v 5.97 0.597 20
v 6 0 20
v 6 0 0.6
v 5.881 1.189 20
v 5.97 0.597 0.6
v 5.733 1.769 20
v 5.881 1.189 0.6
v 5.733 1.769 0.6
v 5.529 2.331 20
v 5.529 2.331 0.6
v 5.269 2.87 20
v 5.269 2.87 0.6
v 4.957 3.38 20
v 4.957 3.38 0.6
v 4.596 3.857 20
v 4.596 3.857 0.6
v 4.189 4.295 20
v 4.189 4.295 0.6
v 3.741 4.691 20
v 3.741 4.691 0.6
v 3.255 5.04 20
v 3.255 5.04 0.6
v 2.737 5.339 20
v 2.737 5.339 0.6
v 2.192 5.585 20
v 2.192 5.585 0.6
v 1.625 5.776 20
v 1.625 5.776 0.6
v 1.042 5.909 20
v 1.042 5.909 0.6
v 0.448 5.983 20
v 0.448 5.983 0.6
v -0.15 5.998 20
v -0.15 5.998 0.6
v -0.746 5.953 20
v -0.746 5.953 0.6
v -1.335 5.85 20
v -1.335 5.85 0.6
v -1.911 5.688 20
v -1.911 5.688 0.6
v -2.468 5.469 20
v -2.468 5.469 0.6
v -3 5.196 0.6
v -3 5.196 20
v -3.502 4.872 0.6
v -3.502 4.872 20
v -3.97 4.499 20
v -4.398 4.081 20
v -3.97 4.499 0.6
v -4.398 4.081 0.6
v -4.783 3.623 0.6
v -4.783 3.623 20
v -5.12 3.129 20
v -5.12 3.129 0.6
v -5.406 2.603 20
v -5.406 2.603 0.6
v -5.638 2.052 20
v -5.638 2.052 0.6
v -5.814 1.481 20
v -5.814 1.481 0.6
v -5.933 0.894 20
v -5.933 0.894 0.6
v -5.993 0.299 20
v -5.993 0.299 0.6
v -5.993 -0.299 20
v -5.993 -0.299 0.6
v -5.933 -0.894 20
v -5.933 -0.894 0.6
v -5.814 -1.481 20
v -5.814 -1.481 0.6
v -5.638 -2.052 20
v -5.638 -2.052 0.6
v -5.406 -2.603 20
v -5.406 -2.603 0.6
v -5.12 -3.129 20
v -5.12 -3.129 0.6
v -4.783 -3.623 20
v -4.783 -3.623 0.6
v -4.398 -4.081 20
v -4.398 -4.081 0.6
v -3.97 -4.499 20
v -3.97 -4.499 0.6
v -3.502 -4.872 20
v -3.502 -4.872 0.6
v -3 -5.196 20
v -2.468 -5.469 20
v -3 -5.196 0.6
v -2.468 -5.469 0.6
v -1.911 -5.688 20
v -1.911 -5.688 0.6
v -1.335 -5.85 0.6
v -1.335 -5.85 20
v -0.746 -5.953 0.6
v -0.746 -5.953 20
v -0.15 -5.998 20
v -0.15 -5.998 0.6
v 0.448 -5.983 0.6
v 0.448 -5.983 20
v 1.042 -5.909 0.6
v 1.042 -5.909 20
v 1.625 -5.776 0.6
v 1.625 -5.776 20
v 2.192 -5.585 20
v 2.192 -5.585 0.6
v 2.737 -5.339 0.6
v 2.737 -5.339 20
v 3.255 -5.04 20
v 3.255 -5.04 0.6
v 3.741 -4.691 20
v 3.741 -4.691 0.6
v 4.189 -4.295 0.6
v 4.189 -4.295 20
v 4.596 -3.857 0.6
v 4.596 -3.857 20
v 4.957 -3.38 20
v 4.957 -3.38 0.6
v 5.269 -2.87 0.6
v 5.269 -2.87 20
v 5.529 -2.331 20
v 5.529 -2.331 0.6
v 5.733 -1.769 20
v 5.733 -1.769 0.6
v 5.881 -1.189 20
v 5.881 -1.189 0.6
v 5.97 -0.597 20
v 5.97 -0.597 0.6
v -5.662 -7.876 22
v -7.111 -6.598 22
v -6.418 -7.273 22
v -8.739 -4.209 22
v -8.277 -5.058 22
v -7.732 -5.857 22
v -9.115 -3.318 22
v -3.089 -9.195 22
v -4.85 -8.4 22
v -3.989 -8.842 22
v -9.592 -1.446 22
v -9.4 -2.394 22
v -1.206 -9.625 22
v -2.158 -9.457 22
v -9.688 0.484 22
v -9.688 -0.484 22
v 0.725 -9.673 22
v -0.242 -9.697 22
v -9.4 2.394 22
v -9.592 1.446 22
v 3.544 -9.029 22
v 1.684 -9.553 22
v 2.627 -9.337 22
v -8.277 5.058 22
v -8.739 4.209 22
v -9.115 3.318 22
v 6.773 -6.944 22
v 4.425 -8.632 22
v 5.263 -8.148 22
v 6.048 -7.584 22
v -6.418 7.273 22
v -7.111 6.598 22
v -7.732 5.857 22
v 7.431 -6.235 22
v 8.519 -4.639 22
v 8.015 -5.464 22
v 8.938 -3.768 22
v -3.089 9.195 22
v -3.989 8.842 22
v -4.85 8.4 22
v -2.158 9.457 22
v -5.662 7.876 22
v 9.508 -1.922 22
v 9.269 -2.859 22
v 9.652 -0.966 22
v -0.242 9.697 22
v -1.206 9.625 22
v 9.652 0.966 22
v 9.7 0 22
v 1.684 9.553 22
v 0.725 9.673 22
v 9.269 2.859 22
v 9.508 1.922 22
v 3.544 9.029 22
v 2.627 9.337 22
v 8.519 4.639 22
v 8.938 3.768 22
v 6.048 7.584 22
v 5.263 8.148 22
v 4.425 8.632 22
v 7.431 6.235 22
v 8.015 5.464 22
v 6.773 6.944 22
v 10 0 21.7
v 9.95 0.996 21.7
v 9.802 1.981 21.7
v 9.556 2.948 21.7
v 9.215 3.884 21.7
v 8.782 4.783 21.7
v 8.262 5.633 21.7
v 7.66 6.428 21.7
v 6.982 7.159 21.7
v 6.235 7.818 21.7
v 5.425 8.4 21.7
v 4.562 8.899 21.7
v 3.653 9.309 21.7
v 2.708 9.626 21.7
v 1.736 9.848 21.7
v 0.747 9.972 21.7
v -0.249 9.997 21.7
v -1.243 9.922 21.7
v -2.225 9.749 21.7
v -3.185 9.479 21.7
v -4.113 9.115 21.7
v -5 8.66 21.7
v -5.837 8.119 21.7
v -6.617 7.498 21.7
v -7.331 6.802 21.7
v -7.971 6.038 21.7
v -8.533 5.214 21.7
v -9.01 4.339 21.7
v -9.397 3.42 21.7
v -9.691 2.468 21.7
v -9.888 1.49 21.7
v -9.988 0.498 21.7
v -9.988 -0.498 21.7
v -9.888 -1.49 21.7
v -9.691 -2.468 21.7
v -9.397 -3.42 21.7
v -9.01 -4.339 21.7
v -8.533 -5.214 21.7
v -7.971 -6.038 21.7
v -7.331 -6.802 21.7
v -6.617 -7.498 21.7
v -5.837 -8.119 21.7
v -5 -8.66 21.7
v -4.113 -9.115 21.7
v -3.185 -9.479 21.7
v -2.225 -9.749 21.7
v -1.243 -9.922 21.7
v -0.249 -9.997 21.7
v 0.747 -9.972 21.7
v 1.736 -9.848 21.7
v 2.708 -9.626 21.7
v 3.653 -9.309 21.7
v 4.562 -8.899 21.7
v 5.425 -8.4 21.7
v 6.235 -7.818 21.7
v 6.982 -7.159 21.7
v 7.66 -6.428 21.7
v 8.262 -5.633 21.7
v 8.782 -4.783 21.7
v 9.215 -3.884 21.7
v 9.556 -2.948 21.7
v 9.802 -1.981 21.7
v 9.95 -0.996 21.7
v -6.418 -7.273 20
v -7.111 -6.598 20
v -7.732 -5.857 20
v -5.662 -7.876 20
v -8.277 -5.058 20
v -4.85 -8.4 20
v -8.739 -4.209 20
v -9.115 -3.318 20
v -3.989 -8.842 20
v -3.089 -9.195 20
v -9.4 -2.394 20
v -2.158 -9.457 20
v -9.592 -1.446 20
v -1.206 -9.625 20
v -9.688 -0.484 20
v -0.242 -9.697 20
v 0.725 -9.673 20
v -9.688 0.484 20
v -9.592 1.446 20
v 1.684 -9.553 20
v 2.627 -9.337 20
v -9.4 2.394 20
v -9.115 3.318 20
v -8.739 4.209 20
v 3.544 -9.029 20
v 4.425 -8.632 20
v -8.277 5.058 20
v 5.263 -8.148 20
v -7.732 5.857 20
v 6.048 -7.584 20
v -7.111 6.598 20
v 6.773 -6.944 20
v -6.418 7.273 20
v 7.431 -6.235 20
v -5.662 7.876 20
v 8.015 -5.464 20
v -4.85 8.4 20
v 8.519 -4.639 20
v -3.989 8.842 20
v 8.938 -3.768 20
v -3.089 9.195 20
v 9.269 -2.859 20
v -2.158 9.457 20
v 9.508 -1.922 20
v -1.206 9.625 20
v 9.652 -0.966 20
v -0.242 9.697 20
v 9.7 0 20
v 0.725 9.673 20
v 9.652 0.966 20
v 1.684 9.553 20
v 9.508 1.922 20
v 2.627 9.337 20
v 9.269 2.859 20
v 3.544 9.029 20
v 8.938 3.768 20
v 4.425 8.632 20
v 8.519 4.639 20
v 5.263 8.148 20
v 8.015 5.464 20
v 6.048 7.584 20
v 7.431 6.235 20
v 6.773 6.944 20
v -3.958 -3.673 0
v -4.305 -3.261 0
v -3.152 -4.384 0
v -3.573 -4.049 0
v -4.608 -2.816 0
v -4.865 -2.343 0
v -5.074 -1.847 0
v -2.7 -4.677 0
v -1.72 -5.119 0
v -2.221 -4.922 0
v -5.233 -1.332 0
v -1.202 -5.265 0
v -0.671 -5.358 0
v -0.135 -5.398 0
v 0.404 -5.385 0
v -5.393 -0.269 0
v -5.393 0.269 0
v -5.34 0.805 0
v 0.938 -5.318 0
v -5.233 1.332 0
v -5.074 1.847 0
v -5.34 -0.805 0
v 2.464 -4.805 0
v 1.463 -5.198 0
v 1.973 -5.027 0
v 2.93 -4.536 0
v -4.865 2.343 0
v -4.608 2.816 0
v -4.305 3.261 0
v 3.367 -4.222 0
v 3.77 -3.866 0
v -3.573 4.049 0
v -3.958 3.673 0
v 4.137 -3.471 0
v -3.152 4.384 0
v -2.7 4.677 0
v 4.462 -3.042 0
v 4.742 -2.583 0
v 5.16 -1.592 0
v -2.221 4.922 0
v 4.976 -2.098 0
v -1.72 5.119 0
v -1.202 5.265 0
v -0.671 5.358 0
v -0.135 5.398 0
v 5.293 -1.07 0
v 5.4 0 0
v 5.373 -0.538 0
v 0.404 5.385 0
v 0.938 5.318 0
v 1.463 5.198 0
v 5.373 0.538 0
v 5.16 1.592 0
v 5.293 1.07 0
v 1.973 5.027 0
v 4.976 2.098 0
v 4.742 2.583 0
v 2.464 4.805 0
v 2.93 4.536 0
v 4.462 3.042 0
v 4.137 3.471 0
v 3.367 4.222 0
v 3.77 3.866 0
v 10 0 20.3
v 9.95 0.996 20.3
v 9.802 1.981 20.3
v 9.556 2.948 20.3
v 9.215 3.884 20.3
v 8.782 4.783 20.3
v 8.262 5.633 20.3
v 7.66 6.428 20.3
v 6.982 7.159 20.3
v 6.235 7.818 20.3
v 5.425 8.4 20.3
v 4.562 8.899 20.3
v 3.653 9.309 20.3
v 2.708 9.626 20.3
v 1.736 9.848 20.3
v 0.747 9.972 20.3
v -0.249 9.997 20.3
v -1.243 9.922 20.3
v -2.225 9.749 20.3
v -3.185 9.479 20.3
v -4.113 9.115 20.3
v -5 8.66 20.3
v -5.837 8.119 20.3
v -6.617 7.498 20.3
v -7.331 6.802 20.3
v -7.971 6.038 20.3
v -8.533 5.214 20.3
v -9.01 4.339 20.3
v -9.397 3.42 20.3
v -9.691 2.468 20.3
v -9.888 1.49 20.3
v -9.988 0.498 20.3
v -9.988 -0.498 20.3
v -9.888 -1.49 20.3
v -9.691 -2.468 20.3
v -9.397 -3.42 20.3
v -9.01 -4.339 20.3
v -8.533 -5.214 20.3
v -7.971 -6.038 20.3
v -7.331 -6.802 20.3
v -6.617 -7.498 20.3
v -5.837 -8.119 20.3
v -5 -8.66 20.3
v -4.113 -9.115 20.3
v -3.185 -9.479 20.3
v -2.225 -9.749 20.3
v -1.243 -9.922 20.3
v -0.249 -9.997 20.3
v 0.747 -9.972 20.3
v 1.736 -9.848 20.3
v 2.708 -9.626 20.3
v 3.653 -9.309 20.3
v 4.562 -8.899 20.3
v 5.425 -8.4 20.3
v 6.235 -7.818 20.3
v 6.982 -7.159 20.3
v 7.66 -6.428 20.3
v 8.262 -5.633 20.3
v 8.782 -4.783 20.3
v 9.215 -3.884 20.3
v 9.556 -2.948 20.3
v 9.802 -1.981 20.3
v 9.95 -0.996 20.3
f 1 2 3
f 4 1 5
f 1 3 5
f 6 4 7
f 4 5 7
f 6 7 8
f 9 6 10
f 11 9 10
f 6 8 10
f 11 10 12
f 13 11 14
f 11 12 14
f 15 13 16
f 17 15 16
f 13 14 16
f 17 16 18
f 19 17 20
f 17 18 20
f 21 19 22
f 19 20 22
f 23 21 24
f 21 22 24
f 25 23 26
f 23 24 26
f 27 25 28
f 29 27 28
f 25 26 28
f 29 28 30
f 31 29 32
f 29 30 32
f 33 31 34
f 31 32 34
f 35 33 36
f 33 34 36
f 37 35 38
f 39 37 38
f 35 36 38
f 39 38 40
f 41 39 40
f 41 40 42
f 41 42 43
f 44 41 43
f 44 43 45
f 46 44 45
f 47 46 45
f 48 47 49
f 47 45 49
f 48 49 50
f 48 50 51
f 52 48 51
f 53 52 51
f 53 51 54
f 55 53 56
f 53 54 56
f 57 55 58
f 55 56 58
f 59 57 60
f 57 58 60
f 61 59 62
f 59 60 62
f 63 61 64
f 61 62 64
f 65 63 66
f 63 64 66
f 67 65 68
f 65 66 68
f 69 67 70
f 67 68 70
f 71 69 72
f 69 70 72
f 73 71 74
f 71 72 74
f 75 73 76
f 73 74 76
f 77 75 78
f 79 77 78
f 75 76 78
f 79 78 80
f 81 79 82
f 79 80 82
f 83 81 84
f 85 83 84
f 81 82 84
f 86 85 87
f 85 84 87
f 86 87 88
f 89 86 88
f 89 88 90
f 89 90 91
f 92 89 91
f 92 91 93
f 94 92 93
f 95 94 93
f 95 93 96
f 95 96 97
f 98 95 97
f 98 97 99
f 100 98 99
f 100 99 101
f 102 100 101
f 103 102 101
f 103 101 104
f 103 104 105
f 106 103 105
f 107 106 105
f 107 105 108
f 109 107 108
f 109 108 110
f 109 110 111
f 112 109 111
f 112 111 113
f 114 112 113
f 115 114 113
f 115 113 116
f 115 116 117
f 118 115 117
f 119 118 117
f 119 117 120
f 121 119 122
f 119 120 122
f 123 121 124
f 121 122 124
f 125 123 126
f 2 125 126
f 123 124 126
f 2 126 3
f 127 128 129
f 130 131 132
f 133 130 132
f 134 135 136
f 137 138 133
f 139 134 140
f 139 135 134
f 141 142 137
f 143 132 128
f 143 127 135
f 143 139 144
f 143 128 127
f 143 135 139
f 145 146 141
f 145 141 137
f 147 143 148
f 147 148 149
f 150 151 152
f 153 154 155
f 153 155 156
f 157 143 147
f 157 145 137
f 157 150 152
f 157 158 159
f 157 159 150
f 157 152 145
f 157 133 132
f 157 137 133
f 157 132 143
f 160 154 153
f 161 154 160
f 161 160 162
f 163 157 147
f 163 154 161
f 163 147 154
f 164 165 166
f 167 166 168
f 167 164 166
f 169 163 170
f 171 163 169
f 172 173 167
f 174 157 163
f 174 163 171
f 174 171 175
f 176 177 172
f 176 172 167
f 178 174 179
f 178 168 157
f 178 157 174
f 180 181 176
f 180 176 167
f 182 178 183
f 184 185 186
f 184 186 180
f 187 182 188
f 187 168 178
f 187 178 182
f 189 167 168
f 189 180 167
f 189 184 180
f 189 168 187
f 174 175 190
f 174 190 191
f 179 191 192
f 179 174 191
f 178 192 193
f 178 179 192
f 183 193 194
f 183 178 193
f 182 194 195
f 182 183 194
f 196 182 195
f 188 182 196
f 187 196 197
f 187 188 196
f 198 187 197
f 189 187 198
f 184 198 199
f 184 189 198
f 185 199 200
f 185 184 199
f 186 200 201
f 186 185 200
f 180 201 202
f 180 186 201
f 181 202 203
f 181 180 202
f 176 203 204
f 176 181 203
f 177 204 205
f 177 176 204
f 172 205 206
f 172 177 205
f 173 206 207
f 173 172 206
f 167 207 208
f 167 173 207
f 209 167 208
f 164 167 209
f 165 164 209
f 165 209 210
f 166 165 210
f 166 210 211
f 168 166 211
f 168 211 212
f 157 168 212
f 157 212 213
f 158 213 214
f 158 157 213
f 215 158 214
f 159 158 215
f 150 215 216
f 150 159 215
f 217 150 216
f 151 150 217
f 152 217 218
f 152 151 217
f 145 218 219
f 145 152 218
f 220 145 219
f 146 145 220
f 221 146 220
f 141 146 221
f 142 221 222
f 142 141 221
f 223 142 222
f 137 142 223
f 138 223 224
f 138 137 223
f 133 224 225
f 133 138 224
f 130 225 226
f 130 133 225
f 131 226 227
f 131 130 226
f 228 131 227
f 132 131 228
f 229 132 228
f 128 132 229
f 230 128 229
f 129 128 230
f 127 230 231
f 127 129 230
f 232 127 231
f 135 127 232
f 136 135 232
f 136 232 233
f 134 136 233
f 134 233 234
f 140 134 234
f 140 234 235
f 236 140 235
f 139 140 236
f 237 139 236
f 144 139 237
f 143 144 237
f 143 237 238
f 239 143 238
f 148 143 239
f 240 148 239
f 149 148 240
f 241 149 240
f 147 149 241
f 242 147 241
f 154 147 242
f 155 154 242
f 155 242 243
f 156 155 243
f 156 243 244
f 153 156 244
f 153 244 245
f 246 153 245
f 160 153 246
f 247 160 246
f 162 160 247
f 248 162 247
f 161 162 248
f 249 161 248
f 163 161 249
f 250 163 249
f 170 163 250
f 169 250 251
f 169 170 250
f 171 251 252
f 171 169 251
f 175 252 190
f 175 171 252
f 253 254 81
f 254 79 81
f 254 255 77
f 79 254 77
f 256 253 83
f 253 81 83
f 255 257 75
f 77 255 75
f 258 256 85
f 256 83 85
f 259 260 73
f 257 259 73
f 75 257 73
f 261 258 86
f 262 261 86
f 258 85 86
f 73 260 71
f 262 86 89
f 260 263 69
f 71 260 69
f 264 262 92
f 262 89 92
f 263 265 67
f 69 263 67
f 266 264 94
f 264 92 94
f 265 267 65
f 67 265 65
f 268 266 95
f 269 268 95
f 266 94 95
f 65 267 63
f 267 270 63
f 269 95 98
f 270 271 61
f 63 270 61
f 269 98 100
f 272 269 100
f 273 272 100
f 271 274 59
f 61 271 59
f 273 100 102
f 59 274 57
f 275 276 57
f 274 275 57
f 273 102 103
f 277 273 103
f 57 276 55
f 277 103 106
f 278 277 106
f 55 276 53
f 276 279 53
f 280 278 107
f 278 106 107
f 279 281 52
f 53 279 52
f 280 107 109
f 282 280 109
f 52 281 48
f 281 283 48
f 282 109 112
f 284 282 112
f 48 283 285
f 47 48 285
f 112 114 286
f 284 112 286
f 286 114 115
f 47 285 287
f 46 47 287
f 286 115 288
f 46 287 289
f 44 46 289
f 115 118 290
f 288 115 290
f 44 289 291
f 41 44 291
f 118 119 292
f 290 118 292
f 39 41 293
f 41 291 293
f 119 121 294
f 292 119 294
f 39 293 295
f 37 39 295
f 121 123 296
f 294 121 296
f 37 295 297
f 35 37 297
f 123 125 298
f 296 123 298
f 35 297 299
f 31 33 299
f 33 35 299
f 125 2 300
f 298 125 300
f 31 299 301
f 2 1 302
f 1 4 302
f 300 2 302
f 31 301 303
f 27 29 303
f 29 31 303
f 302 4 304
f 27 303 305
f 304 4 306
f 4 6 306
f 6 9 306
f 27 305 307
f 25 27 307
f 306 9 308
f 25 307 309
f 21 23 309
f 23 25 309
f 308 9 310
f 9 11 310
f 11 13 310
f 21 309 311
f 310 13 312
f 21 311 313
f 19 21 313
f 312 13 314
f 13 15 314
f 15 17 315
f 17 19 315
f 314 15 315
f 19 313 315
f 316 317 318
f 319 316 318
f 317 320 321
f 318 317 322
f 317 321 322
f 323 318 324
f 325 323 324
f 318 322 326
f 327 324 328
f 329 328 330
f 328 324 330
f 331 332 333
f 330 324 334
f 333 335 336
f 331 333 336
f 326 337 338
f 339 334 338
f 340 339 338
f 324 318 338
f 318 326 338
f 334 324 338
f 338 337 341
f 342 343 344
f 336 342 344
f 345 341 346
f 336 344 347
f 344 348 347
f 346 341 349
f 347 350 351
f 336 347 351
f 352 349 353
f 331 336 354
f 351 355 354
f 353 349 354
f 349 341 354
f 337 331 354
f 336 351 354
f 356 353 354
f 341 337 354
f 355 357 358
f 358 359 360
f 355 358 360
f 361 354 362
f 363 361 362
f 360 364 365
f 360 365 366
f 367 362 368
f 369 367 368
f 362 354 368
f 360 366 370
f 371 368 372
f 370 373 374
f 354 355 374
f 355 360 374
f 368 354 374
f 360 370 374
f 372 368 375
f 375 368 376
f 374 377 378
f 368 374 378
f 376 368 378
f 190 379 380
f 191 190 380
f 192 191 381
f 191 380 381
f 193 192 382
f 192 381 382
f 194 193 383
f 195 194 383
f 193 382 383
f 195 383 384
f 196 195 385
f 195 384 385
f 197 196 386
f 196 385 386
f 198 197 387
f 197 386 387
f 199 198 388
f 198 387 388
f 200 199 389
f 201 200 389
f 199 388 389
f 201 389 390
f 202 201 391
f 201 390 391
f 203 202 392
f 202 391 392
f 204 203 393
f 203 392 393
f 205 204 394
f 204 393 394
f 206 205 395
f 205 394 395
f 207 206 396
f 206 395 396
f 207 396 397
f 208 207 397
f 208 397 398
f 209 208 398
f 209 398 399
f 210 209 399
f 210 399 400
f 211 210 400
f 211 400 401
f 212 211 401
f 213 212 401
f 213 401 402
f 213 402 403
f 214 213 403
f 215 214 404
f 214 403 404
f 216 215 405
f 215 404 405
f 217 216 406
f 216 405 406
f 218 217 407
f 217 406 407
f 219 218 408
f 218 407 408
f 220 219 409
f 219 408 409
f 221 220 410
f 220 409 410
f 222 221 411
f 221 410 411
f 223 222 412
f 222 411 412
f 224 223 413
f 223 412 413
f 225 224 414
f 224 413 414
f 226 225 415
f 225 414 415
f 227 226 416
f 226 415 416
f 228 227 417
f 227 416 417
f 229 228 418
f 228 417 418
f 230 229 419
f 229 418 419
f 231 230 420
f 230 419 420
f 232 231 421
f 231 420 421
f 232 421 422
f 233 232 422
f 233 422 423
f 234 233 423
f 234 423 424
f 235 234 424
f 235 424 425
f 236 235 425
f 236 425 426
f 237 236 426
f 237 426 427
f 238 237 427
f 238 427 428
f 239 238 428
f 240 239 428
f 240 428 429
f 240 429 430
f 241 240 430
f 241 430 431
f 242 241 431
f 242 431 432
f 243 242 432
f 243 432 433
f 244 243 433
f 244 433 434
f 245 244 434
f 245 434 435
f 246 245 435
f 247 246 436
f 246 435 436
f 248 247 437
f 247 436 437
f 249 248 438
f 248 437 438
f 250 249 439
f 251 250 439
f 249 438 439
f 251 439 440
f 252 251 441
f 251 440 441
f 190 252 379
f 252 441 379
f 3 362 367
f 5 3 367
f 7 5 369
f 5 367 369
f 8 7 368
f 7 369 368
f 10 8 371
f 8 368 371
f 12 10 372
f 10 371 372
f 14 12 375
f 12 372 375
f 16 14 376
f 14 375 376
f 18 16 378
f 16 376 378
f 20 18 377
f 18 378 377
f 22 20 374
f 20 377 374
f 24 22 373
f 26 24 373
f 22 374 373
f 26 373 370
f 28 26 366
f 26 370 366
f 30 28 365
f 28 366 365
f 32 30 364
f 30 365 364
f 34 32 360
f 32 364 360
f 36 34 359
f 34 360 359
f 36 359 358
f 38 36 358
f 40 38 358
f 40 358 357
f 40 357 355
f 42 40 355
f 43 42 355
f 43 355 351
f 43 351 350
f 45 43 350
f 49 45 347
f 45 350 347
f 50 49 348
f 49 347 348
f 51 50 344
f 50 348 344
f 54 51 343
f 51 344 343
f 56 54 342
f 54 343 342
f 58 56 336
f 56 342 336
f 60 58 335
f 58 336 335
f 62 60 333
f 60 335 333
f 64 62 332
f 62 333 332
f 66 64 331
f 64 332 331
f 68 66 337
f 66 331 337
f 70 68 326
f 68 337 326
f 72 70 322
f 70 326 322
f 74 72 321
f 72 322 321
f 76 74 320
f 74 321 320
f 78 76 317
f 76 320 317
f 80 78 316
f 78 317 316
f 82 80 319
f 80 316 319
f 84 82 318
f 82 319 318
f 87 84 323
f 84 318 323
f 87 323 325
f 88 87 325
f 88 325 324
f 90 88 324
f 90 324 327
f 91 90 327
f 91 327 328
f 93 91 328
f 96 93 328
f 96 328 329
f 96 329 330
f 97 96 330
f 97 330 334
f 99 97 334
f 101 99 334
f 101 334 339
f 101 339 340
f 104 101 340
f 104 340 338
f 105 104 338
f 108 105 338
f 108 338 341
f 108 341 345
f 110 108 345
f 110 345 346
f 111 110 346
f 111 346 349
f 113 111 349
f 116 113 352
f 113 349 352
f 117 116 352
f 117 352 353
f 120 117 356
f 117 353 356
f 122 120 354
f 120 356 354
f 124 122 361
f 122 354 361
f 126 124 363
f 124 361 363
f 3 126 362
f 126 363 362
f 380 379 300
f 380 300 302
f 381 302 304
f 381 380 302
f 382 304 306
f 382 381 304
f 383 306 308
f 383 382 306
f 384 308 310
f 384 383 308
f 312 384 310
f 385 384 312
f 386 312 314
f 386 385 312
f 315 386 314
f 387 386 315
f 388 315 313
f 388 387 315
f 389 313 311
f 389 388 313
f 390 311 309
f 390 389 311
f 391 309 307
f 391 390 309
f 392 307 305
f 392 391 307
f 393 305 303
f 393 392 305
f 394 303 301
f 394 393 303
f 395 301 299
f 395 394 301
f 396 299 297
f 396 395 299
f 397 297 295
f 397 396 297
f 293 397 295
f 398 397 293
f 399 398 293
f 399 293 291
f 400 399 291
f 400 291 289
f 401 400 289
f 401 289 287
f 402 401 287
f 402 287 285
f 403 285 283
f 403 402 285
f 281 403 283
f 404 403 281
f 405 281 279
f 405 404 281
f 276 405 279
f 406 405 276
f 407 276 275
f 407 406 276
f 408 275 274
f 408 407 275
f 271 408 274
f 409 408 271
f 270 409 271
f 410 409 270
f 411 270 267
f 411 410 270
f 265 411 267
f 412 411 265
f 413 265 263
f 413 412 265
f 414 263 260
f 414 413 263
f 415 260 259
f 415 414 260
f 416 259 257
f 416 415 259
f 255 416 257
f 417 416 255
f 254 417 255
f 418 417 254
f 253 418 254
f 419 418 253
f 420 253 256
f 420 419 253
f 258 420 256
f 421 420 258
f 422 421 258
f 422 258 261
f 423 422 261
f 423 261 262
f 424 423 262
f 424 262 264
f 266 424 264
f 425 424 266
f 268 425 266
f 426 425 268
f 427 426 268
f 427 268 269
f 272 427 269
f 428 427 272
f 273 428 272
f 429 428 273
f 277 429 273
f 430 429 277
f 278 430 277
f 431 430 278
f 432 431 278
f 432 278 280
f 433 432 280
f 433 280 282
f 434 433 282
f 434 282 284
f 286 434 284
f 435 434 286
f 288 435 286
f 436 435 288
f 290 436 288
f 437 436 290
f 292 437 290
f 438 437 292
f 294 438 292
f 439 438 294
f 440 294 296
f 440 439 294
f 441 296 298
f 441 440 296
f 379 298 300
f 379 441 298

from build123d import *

# Parameters (mm, degrees)
SKETCH2_R           = 6
BOSS_EXTRUDE1_DEPTH = 20
SKETCH3_R           = 10
BOSS_EXTRUDE2_DEPTH = 2
CHAMFER1_SIZE       = 0.6
CHAMFER2_SIZE       = 0.3


with BuildPart() as part:
    # Sketch2 → Boss-Extrude1 (new body)
    with BuildSketch(Plane.XY):
        Circle(SKETCH2_R)
    extrude(amount=BOSS_EXTRUDE1_DEPTH)

    # Sketch3 → Boss-Extrude2 (add)
    with BuildSketch(Plane.XY.offset(20)):
        Circle(SKETCH3_R)
    extrude(amount=BOSS_EXTRUDE2_DEPTH)

    # Chamfer1
    chamfer1_edges = [part.edges().sort_by_distance(p)[0] for p in [
        (-6, 0, 0),
    ]]
    chamfer(chamfer1_edges, length=CHAMFER1_SIZE)

    # Chamfer2
    chamfer2_edges = [part.edges().sort_by_distance(p)[0] for p in [
        (-10, 0, 20),
        (-10, 0, 22),
    ]]
    chamfer(chamfer2_edges, length=CHAMFER2_SIZE)


solid = part.part
